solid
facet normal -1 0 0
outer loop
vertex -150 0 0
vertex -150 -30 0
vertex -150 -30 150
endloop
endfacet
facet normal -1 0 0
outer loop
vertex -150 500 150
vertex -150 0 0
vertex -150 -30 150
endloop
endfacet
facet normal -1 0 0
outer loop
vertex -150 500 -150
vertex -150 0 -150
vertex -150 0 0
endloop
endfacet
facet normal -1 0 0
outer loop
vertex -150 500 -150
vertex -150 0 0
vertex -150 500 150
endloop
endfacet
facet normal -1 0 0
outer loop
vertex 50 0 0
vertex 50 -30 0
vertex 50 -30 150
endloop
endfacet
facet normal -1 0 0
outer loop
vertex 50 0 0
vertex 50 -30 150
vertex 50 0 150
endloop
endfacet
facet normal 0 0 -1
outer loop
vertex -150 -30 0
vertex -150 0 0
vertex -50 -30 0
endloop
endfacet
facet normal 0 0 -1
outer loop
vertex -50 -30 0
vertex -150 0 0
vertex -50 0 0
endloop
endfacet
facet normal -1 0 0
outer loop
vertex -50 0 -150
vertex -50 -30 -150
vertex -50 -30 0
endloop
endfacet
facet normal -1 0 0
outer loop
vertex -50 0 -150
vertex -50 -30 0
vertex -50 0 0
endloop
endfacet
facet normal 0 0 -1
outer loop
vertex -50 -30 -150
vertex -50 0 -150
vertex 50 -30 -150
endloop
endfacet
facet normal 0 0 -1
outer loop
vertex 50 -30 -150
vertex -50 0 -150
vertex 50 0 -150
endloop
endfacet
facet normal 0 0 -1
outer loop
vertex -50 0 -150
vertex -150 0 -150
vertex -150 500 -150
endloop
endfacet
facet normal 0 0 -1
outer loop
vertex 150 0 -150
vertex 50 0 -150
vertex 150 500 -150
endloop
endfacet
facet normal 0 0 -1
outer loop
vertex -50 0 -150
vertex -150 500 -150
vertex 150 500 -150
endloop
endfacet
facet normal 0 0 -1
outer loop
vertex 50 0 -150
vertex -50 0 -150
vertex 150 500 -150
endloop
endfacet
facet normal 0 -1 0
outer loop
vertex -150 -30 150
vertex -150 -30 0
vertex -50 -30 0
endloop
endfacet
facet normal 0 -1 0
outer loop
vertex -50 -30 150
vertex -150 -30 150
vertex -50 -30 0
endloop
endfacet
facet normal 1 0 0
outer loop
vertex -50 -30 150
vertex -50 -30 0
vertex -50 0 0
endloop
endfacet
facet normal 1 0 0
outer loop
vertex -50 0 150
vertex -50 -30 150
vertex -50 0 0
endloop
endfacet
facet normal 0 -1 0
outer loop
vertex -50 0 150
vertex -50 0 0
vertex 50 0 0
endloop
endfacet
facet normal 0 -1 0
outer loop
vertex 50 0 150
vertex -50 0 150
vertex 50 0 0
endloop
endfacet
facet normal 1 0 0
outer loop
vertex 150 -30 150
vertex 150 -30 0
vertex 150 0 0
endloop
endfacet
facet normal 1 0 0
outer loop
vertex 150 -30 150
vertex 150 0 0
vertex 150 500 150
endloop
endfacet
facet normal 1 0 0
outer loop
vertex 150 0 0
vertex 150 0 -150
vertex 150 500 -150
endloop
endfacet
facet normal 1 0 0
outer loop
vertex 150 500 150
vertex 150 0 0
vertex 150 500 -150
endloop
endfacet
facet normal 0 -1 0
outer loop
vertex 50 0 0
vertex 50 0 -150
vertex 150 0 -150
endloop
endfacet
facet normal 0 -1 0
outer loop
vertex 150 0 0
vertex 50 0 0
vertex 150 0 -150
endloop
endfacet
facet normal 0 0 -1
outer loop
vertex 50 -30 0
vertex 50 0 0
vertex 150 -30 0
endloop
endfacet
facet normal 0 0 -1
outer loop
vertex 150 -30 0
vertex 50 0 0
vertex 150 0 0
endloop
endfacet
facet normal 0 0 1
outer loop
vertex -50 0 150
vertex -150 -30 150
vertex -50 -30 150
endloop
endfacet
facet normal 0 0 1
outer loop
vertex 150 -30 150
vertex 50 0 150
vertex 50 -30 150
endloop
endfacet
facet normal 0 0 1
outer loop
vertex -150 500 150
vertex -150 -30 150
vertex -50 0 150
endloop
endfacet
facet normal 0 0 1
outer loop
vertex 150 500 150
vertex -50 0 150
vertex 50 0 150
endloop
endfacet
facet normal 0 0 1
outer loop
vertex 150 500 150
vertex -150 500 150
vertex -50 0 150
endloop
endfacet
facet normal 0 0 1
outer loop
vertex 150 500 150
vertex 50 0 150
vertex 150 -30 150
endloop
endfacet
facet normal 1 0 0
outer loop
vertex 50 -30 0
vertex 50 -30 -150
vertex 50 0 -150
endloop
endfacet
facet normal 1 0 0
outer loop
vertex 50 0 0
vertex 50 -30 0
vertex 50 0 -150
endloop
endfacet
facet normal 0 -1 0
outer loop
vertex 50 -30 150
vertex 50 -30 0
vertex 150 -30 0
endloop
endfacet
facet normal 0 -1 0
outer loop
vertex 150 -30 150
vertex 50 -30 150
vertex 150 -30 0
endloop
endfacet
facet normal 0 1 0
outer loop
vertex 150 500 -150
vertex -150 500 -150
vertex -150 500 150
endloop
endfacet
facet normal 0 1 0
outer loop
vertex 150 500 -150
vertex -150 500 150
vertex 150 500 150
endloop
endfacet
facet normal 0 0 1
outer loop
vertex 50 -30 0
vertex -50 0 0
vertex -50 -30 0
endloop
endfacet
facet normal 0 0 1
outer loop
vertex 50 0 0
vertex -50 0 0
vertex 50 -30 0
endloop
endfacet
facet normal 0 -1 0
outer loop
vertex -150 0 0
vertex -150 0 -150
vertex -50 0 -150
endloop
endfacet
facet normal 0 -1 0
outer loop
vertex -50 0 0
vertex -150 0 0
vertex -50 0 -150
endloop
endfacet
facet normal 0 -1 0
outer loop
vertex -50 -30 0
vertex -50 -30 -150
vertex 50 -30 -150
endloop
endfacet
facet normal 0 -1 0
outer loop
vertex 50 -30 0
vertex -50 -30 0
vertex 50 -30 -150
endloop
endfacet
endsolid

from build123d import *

# Parameters (mm, degrees)
BOX001_W     = 100
BOX001_H     = 30
BOX001_DEPTH = 150
BOX_W        = 300
BOX_H        = 500
BOX_DEPTH    = 300


with BuildPart() as cube001:
    # Box001 → Box001 (new body)
    with BuildSketch(Plane(origin=(50, -30, 0), x_dir=(1, 0, 0), z_dir=(0, 0, 1))):
        with Locations((50, 15)):
            Rectangle(BOX001_W, BOX001_H)
    extrude(amount=BOX001_DEPTH)


with BuildPart() as cube002:
    # Clone base: copy of Cube001
    add(cube001.part)


with BuildPart() as cube002_1:
    # Clone placement: moved
    add(cube002.part.moved(Location((-200, 0, 0))))


with BuildPart() as cube003:
    # Clone001 base: copy of Cube002
    add(cube002_1.part)


with BuildPart() as cube003_1:
    # Clone001 placement: moved
    add(cube003.part.moved(Location((100, 0, -150))))


with BuildPart() as fusion:
    # Box → Box (new body)
    with BuildSketch(Plane(origin=(-150, 0, -150), x_dir=(1, 0, 0), z_dir=(0, 0, 1))):
        with Locations((150, 250)):
            Rectangle(BOX_W, BOX_H)
    extrude(amount=BOX_DEPTH)

    # Fusion: union Cube001, Cube002, Cube003
    add(cube001.part)
    add(cube002_1.part)
    add(cube003_1.part)


solid = fusion.part
